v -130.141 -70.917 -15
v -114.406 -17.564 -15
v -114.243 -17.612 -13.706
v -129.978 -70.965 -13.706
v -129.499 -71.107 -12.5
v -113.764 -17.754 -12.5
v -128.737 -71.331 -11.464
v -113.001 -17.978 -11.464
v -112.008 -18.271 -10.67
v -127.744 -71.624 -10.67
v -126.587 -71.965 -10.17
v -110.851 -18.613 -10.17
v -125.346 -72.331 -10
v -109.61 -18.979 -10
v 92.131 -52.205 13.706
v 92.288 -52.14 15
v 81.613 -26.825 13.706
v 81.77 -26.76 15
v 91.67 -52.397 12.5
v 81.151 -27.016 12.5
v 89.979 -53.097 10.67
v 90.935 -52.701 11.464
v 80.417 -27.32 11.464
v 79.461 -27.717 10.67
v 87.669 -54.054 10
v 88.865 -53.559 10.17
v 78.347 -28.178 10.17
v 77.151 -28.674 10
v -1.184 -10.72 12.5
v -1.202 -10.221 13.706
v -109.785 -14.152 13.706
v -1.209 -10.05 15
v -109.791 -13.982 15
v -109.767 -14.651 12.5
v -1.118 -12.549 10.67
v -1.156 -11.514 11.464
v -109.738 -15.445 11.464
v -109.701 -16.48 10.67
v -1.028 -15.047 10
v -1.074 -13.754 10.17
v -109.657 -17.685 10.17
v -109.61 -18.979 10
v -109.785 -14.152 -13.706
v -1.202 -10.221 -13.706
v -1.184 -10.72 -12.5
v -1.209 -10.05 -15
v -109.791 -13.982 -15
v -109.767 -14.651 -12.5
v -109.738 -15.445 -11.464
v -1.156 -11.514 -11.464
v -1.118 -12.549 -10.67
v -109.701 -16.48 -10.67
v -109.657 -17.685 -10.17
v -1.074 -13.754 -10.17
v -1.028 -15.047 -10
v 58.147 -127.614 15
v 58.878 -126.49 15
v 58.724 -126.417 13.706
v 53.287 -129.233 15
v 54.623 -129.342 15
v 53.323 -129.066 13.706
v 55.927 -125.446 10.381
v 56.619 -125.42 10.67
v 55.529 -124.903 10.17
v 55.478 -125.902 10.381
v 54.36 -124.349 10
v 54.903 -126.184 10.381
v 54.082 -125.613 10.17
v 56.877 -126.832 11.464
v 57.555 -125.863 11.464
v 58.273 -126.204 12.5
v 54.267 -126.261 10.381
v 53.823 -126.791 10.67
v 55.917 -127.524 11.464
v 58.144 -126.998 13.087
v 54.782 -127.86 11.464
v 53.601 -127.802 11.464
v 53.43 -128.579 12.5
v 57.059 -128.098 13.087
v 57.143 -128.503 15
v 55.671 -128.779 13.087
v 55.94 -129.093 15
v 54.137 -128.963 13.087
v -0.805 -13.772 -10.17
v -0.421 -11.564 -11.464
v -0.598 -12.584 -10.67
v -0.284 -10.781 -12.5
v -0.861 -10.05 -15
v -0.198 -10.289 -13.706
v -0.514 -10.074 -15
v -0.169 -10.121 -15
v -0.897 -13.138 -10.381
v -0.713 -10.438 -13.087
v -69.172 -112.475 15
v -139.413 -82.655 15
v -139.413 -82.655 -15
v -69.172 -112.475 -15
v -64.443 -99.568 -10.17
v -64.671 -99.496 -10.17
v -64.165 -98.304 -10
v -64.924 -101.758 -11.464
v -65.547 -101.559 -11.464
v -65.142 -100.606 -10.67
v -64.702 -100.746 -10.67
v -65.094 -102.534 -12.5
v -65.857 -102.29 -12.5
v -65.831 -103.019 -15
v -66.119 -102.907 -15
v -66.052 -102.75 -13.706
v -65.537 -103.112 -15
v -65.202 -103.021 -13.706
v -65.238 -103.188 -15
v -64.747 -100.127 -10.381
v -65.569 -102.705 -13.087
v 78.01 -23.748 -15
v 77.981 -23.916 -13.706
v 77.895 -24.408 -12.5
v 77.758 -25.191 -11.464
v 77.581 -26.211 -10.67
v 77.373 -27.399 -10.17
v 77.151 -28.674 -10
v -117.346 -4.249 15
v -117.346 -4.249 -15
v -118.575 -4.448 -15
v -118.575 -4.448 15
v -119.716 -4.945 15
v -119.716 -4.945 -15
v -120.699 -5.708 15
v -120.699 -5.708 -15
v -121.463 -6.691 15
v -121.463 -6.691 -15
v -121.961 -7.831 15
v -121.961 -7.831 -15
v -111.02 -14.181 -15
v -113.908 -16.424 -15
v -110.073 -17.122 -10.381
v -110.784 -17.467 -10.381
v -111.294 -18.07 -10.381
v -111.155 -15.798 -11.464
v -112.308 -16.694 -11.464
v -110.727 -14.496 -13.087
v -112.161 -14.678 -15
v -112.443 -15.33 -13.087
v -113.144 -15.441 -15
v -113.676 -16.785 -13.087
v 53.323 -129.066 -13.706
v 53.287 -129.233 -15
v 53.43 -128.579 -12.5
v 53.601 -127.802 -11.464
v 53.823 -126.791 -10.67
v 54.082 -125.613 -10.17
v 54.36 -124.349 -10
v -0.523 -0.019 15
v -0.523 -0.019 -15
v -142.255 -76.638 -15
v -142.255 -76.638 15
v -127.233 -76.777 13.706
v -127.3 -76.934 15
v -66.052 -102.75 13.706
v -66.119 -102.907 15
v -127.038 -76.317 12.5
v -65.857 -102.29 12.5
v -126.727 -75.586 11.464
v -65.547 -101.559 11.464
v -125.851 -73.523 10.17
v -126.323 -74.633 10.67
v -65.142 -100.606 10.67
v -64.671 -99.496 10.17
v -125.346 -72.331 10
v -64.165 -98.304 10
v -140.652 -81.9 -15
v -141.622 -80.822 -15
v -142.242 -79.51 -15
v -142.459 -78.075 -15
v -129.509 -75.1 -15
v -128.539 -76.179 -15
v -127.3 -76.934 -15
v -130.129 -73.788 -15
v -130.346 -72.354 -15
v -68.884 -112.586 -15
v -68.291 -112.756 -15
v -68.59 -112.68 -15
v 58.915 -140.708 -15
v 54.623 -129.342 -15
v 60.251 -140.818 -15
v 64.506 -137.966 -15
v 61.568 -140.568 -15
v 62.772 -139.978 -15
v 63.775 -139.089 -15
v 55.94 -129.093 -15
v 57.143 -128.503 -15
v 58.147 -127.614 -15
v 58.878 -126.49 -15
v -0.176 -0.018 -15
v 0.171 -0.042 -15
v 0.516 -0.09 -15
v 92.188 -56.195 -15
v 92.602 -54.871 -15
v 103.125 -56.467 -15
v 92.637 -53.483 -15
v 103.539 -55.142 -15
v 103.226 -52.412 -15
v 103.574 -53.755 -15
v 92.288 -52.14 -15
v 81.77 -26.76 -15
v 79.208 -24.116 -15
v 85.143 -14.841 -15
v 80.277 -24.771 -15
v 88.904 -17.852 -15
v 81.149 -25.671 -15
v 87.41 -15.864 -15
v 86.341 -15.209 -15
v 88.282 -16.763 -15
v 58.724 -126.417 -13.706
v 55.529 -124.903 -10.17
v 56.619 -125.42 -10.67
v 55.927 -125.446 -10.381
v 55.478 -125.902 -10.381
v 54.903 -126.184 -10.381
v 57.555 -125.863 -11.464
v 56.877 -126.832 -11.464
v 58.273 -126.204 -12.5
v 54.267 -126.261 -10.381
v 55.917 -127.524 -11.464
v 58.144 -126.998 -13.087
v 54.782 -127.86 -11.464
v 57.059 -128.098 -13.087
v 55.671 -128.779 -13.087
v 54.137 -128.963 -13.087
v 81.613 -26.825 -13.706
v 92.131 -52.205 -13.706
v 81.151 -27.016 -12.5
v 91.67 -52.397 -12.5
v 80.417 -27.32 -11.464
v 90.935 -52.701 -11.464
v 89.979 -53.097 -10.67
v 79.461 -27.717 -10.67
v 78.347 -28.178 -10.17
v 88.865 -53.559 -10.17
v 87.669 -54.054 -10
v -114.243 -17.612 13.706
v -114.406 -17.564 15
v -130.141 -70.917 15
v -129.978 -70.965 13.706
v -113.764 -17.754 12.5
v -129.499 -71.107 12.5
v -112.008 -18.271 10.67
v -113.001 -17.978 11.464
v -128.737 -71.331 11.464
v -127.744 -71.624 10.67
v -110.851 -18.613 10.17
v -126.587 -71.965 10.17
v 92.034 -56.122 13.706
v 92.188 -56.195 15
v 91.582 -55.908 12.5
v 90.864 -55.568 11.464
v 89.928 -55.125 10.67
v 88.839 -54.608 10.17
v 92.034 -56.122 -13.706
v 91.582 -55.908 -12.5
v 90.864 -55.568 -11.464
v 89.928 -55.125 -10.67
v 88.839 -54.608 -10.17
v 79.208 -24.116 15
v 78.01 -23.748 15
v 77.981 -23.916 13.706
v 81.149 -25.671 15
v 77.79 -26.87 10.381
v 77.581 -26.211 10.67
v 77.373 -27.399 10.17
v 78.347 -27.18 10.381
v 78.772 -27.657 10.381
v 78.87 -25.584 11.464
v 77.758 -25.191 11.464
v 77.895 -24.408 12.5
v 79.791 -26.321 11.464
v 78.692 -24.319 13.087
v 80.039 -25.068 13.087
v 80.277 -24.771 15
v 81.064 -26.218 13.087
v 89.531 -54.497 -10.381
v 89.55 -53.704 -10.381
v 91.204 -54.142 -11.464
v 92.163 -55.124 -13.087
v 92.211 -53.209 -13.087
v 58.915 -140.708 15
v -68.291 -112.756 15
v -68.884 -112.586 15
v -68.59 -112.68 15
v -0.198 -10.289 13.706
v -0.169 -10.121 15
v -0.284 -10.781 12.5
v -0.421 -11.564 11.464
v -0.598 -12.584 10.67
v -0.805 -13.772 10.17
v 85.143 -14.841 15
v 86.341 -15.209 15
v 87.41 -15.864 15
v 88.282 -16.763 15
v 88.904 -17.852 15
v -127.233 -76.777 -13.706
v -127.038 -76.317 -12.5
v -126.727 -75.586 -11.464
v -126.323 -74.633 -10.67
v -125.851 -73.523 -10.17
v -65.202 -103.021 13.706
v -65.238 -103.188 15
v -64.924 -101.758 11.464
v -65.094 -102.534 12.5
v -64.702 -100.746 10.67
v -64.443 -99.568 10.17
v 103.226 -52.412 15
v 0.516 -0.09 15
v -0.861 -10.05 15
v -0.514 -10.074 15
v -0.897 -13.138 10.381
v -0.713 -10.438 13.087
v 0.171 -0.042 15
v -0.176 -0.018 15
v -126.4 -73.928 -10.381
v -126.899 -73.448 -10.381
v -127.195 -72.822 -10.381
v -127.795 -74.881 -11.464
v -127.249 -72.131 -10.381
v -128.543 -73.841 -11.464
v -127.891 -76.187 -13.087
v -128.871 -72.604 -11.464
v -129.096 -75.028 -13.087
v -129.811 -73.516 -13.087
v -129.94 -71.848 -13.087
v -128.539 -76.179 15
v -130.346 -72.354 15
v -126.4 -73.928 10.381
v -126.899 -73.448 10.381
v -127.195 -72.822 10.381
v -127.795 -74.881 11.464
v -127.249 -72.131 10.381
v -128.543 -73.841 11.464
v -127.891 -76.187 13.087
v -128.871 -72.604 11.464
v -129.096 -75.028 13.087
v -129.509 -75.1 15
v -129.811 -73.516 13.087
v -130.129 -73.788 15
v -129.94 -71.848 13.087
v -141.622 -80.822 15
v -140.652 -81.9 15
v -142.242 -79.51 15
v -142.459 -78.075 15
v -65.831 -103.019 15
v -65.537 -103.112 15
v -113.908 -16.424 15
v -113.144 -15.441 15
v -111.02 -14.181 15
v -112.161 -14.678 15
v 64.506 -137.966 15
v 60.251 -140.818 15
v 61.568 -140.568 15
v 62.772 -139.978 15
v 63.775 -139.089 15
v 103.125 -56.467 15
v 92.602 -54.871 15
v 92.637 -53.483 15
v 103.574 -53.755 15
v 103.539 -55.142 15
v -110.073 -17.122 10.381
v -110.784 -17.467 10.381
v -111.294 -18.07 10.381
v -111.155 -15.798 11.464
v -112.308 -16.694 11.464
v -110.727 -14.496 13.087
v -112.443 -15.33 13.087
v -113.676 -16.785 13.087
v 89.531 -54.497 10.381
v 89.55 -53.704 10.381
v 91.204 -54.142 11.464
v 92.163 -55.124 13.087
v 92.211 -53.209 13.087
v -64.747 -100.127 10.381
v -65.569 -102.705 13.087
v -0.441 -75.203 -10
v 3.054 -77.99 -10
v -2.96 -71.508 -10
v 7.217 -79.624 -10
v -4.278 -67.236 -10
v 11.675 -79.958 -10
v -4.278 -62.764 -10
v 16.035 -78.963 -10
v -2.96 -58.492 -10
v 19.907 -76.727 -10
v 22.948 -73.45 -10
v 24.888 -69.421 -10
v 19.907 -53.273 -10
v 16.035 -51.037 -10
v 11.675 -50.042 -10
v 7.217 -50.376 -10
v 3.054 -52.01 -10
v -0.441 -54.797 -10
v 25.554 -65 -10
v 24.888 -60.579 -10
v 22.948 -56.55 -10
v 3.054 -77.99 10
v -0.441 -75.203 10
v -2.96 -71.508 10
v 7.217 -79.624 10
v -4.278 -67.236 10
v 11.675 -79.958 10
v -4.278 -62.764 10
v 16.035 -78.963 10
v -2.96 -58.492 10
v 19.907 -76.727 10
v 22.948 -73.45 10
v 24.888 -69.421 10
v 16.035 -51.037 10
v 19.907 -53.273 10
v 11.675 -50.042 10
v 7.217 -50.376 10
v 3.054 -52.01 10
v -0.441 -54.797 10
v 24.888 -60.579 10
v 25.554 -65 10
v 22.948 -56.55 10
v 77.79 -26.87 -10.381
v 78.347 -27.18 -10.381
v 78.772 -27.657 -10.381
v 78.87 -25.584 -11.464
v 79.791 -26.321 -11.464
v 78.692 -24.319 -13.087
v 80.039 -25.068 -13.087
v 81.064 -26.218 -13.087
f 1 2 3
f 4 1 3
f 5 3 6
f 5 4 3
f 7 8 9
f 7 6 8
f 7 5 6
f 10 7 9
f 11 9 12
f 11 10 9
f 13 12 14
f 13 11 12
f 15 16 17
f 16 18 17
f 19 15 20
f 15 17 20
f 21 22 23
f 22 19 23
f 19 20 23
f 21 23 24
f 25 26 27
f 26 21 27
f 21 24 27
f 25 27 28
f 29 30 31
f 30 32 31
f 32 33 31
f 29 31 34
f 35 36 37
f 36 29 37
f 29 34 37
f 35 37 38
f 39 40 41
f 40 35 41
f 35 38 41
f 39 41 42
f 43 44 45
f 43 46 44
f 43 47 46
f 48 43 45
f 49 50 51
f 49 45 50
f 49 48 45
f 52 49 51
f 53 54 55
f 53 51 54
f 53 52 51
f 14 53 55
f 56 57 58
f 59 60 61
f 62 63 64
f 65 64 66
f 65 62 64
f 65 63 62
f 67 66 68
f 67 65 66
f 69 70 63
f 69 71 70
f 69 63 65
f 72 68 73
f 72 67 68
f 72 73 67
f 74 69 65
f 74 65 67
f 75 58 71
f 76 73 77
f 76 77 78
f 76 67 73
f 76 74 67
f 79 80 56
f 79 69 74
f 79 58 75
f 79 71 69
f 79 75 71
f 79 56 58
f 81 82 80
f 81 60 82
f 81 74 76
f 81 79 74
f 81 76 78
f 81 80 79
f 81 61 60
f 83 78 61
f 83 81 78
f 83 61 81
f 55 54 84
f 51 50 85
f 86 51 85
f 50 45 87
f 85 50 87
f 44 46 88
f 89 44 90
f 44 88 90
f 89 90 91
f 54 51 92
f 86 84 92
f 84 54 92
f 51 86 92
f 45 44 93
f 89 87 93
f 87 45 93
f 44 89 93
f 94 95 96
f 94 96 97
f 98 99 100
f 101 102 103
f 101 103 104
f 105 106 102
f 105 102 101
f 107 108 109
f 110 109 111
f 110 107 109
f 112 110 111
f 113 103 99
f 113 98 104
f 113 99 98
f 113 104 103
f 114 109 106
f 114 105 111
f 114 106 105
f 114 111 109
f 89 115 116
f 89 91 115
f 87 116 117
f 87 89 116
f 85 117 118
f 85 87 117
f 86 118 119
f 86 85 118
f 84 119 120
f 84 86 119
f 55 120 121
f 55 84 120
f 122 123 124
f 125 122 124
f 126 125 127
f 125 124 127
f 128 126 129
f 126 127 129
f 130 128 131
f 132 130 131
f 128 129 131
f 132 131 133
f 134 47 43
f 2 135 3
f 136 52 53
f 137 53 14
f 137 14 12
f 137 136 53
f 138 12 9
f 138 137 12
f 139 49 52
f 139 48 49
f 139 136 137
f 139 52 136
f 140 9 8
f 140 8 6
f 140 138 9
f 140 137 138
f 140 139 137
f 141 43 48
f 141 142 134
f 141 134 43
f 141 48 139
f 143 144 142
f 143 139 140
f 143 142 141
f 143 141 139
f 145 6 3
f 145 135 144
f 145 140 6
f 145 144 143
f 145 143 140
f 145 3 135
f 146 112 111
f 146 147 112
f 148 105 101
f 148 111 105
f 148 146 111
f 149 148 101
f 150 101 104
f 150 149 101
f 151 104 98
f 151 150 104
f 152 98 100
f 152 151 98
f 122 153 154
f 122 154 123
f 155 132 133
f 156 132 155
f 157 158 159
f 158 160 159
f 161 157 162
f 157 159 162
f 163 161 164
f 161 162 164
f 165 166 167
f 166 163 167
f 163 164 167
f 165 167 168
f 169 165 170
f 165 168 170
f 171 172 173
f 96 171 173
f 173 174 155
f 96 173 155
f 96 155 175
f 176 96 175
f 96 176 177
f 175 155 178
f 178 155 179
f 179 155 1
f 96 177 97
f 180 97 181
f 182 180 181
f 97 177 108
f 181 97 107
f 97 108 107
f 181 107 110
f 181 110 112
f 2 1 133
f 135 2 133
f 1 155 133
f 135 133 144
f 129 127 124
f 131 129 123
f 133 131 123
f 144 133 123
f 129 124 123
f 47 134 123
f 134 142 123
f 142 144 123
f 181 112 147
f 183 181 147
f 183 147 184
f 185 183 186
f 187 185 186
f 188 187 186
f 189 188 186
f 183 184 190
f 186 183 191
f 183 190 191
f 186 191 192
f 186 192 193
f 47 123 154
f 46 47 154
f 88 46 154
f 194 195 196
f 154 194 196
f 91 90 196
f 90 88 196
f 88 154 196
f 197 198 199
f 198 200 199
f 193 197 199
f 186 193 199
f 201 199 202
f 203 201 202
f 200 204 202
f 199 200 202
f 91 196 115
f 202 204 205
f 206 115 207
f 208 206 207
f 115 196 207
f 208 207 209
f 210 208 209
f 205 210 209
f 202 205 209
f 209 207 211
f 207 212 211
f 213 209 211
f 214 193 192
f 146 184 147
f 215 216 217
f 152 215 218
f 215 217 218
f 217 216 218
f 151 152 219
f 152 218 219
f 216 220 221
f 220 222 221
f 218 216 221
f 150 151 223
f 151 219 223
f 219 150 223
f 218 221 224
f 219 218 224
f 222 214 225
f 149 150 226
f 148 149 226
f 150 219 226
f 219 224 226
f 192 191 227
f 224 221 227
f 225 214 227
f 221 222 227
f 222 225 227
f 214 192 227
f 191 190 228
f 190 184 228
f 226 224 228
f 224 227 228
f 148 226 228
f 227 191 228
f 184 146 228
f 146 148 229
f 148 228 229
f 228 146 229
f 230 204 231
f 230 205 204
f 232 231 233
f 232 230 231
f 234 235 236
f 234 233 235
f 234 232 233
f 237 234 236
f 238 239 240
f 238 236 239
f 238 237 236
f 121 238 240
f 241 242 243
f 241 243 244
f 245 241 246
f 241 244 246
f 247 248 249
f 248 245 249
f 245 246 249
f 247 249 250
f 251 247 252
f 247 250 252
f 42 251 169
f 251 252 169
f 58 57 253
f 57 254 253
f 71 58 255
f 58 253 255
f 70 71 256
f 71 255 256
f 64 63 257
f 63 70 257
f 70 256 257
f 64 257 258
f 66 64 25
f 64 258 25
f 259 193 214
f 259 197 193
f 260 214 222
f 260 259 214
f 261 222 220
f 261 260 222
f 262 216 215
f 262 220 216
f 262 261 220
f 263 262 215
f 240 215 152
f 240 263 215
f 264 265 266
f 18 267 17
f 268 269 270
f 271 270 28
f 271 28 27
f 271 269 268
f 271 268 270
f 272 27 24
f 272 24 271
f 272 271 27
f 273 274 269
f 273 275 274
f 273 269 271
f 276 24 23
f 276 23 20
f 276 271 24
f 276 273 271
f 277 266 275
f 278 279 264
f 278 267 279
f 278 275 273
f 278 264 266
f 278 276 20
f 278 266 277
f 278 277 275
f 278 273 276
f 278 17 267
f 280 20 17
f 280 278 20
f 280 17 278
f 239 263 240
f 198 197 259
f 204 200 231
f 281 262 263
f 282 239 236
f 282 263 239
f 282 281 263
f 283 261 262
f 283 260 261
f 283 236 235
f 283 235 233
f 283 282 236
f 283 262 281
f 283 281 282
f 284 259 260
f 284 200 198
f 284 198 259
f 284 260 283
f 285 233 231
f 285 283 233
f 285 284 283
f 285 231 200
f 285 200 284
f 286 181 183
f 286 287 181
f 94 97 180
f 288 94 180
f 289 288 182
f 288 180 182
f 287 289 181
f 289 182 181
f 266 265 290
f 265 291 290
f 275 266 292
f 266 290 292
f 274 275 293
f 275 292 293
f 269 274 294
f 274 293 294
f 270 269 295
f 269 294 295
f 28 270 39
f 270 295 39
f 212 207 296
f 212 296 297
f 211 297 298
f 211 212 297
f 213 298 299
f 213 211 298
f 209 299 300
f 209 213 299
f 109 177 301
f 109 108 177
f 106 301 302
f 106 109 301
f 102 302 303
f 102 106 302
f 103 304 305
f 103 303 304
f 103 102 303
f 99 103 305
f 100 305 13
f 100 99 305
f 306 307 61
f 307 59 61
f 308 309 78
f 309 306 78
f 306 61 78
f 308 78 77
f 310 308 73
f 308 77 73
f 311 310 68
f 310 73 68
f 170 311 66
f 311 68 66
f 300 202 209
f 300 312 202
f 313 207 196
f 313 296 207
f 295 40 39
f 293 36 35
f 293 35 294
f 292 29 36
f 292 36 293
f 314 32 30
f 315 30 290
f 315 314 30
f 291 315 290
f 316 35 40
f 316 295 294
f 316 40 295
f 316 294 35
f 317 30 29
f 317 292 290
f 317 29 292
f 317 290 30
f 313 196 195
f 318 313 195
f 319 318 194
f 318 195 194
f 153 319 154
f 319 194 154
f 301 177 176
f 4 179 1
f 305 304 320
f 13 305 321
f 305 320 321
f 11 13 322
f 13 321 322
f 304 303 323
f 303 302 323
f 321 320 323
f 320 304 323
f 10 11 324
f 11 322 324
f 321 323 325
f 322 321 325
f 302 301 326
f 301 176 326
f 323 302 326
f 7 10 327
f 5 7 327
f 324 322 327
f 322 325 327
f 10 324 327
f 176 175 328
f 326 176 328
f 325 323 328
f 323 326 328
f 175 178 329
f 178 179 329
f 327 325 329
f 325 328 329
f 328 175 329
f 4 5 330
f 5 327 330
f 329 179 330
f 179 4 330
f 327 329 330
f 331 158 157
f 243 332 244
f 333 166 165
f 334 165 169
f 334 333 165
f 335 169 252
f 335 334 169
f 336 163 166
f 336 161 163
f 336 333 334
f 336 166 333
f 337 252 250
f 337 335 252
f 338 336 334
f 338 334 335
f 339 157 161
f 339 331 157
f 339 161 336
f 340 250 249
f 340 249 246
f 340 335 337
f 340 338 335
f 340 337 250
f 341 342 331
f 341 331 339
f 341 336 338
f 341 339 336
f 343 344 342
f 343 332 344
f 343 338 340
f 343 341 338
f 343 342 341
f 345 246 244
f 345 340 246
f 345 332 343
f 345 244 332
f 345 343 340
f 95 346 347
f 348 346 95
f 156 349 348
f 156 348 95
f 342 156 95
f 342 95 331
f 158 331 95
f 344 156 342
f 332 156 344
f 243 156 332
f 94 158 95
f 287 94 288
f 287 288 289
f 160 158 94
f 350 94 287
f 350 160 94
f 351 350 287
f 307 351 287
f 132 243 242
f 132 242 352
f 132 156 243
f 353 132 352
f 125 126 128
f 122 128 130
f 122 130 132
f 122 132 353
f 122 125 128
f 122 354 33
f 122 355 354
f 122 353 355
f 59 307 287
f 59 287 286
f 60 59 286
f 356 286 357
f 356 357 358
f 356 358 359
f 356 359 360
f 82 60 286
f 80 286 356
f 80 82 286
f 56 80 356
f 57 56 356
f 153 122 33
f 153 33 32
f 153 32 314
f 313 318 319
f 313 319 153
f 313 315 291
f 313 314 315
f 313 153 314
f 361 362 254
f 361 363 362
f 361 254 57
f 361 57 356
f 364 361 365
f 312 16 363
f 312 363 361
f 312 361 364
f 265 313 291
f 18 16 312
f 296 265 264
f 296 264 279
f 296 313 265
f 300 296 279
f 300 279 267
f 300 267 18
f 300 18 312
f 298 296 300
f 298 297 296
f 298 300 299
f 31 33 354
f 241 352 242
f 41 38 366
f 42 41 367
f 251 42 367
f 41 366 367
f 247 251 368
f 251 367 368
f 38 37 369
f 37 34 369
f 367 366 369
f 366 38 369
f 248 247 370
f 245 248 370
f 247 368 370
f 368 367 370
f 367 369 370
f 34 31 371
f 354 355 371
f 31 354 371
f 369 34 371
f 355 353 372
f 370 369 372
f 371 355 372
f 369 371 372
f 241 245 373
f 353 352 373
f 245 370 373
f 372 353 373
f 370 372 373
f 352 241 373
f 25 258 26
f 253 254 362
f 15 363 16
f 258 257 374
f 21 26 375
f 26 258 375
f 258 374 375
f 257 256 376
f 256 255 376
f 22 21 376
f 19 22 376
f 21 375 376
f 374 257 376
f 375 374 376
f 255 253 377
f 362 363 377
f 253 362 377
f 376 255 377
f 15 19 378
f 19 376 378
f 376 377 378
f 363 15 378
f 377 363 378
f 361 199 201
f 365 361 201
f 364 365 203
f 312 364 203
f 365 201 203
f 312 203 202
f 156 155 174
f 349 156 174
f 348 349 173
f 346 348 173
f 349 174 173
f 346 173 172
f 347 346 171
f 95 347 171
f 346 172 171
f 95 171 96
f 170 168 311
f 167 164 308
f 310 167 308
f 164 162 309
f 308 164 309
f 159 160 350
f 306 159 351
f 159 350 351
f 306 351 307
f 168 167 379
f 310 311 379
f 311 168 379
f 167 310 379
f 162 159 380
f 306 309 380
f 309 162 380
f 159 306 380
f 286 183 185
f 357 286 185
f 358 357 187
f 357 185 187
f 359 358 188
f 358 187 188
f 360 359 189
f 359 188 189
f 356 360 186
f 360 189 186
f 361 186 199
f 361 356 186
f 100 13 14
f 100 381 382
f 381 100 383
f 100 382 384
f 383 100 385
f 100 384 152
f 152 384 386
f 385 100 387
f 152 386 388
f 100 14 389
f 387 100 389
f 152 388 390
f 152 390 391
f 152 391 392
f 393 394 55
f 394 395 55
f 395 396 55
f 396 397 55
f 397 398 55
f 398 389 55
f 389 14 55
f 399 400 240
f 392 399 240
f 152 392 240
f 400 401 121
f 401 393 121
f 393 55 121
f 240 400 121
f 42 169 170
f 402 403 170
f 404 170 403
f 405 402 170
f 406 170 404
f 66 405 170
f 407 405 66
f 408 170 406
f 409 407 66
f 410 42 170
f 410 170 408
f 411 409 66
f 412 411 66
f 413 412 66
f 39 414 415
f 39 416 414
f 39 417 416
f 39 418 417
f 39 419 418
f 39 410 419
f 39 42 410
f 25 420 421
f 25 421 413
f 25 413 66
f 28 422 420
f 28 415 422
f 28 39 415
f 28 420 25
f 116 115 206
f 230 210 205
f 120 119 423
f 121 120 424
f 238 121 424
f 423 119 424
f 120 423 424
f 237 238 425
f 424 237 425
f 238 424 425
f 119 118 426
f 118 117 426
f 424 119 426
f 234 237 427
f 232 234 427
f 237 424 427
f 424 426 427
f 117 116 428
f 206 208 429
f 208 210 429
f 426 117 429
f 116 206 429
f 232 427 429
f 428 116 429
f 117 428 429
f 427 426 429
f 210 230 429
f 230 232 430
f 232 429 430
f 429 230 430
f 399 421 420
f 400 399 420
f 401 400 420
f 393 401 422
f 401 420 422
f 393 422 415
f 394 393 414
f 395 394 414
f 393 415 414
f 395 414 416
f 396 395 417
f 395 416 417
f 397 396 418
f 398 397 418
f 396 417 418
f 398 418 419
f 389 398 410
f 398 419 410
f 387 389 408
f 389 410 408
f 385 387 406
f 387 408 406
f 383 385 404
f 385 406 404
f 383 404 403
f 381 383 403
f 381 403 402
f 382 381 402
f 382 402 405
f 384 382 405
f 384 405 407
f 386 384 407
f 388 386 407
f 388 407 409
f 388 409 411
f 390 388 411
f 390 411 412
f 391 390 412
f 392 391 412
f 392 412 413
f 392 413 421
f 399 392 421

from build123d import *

# Parameters (mm, degrees)
F1_DEPTH = 15
F2_T     = -10
F3_R     = 4.99999
F5_R     = 15
F6_DEPTH = 25


# Not quite as in the source:
# - a fillet or chamfer is up to 0.001 mm smaller than in the source, because OpenCascade refuses the exact size


with BuildPart() as f1:
    # F0 (on Top) → F1 (new body)
    with BuildSketch(Plane.XY):
        Polygon((87.8512188792, -15.3126027435), (0, 0), (-120.9431961179, -4.3791108765), (-143.5155719519, -80.9135511518), (-68.7445923686, -112.6559451222), (62.802106142, -141.5623724461), (104.0751114488, -54.4615574181), align=None)
    extrude(amount=F1_DEPTH)

    # F2
    f2_openings = [f1.faces().sort_by_distance(p)[0] for p in [
        (-14.831711, -62.307507, 15),
    ]]
    offset(amount=F2_T, openings=f2_openings)

    # F3 (radius 5 in the source; OpenCascade refuses exactly that, so slightly less here)
    f3_edges = [f1.edges().sort_by_distance(p)[0] for p in [
        (-143.515572, -80.913551, 7.5),
        (-68.744592, -112.655945, 7.5),
        (62.802106, -141.562372, 7.5),
        (104.075111, -54.461557, 7.5),
        (87.851219, -15.312603, 7.5),
        (0, 0, 7.5),
        (-120.943196, -4.379111, 7.5),
        (75.155878, -92.138524, 10),
        (-4.258831, -116.587633, 10),
        (57.17386, -130.087018, 12.5),
        (-65.691523, -103.088247, 12.5),
        (-98.546913, -89.140205, 10),
        (86.927893, -39.205026, 10),
        (93.137896, -54.19003, 12.5),
        (80.717891, -24.220021, 12.5),
        (40.016406, -17.12569, 10),
        (-0.685079, -10.031358, 12.5),
        (-57.036491, -12.07173, 10),
        (-122.395103, -44.652133, 10),
        (-113.387903, -14.112102, 12.5),
        (-131.402304, -75.192163, 12.5),
    ]]
    fillet(f3_edges, radius=F3_R)

    # F4: F1 across plane


with BuildPart() as f1_1:
    add(f1.part)
    add(f1.part.mirror(Plane.XY))

    # F5 (on face) → F6 (cut)
    with BuildSketch(Plane.XY.offset(10)):
        with Locations((10.5543992388, -65)):
            Circle(F5_R)
    extrude(amount=-F6_DEPTH, mode=Mode.SUBTRACT)


solid = f1_1.part
